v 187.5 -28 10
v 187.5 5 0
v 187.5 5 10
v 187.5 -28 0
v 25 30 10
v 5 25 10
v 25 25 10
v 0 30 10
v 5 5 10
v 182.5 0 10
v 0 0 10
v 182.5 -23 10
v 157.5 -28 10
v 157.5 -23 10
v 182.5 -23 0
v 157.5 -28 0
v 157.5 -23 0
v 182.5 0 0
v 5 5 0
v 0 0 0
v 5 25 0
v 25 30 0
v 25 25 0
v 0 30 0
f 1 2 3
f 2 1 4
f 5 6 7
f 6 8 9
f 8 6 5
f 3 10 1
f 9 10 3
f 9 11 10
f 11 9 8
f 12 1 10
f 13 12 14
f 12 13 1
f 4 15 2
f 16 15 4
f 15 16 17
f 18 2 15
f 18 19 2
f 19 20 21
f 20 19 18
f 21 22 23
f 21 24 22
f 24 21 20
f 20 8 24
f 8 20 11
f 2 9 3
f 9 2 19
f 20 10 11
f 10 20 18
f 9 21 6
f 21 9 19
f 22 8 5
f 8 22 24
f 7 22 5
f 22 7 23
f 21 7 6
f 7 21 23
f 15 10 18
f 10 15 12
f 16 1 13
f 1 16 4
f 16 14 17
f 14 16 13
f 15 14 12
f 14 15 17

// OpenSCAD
// iPad Dimensions
ipad_l = 250;
ipad_w = 175;
ipad_d = 5;

// Frame dimension
frame_t = 20;
frame_p = 3;

// Constants
thickness = 10;
width = 5;

// Calculated Sizes
// Main Strut
ms = 0.75 * ipad_l;
// Small hook
sh_b = 2 * (ipad_d + width + 5);
sh_s = 25;

// Large Hook
lh_t = frame_t + frame_p + (2 * width);
lh_s = 30;

// Main Model Construction
// Main Strut
color("red")
  cube([ms, width, thickness]);

  // Small hook to hold iPad
color("blue")
  cube([width, sh_b, thickness]);
color("aqua")
  translate([0, sh_b - width, 0])
    cube([sh_s, width, thickness]);

  // Large hook to attach to frame
color("green")
  translate([ms - width, width - lh_t, 0])
    cube([width, lh_t, thickness]);
color("yellow")
  translate([ms - lh_s, width - lh_t, 0])
    cube([lh_s, width, thickness]);
